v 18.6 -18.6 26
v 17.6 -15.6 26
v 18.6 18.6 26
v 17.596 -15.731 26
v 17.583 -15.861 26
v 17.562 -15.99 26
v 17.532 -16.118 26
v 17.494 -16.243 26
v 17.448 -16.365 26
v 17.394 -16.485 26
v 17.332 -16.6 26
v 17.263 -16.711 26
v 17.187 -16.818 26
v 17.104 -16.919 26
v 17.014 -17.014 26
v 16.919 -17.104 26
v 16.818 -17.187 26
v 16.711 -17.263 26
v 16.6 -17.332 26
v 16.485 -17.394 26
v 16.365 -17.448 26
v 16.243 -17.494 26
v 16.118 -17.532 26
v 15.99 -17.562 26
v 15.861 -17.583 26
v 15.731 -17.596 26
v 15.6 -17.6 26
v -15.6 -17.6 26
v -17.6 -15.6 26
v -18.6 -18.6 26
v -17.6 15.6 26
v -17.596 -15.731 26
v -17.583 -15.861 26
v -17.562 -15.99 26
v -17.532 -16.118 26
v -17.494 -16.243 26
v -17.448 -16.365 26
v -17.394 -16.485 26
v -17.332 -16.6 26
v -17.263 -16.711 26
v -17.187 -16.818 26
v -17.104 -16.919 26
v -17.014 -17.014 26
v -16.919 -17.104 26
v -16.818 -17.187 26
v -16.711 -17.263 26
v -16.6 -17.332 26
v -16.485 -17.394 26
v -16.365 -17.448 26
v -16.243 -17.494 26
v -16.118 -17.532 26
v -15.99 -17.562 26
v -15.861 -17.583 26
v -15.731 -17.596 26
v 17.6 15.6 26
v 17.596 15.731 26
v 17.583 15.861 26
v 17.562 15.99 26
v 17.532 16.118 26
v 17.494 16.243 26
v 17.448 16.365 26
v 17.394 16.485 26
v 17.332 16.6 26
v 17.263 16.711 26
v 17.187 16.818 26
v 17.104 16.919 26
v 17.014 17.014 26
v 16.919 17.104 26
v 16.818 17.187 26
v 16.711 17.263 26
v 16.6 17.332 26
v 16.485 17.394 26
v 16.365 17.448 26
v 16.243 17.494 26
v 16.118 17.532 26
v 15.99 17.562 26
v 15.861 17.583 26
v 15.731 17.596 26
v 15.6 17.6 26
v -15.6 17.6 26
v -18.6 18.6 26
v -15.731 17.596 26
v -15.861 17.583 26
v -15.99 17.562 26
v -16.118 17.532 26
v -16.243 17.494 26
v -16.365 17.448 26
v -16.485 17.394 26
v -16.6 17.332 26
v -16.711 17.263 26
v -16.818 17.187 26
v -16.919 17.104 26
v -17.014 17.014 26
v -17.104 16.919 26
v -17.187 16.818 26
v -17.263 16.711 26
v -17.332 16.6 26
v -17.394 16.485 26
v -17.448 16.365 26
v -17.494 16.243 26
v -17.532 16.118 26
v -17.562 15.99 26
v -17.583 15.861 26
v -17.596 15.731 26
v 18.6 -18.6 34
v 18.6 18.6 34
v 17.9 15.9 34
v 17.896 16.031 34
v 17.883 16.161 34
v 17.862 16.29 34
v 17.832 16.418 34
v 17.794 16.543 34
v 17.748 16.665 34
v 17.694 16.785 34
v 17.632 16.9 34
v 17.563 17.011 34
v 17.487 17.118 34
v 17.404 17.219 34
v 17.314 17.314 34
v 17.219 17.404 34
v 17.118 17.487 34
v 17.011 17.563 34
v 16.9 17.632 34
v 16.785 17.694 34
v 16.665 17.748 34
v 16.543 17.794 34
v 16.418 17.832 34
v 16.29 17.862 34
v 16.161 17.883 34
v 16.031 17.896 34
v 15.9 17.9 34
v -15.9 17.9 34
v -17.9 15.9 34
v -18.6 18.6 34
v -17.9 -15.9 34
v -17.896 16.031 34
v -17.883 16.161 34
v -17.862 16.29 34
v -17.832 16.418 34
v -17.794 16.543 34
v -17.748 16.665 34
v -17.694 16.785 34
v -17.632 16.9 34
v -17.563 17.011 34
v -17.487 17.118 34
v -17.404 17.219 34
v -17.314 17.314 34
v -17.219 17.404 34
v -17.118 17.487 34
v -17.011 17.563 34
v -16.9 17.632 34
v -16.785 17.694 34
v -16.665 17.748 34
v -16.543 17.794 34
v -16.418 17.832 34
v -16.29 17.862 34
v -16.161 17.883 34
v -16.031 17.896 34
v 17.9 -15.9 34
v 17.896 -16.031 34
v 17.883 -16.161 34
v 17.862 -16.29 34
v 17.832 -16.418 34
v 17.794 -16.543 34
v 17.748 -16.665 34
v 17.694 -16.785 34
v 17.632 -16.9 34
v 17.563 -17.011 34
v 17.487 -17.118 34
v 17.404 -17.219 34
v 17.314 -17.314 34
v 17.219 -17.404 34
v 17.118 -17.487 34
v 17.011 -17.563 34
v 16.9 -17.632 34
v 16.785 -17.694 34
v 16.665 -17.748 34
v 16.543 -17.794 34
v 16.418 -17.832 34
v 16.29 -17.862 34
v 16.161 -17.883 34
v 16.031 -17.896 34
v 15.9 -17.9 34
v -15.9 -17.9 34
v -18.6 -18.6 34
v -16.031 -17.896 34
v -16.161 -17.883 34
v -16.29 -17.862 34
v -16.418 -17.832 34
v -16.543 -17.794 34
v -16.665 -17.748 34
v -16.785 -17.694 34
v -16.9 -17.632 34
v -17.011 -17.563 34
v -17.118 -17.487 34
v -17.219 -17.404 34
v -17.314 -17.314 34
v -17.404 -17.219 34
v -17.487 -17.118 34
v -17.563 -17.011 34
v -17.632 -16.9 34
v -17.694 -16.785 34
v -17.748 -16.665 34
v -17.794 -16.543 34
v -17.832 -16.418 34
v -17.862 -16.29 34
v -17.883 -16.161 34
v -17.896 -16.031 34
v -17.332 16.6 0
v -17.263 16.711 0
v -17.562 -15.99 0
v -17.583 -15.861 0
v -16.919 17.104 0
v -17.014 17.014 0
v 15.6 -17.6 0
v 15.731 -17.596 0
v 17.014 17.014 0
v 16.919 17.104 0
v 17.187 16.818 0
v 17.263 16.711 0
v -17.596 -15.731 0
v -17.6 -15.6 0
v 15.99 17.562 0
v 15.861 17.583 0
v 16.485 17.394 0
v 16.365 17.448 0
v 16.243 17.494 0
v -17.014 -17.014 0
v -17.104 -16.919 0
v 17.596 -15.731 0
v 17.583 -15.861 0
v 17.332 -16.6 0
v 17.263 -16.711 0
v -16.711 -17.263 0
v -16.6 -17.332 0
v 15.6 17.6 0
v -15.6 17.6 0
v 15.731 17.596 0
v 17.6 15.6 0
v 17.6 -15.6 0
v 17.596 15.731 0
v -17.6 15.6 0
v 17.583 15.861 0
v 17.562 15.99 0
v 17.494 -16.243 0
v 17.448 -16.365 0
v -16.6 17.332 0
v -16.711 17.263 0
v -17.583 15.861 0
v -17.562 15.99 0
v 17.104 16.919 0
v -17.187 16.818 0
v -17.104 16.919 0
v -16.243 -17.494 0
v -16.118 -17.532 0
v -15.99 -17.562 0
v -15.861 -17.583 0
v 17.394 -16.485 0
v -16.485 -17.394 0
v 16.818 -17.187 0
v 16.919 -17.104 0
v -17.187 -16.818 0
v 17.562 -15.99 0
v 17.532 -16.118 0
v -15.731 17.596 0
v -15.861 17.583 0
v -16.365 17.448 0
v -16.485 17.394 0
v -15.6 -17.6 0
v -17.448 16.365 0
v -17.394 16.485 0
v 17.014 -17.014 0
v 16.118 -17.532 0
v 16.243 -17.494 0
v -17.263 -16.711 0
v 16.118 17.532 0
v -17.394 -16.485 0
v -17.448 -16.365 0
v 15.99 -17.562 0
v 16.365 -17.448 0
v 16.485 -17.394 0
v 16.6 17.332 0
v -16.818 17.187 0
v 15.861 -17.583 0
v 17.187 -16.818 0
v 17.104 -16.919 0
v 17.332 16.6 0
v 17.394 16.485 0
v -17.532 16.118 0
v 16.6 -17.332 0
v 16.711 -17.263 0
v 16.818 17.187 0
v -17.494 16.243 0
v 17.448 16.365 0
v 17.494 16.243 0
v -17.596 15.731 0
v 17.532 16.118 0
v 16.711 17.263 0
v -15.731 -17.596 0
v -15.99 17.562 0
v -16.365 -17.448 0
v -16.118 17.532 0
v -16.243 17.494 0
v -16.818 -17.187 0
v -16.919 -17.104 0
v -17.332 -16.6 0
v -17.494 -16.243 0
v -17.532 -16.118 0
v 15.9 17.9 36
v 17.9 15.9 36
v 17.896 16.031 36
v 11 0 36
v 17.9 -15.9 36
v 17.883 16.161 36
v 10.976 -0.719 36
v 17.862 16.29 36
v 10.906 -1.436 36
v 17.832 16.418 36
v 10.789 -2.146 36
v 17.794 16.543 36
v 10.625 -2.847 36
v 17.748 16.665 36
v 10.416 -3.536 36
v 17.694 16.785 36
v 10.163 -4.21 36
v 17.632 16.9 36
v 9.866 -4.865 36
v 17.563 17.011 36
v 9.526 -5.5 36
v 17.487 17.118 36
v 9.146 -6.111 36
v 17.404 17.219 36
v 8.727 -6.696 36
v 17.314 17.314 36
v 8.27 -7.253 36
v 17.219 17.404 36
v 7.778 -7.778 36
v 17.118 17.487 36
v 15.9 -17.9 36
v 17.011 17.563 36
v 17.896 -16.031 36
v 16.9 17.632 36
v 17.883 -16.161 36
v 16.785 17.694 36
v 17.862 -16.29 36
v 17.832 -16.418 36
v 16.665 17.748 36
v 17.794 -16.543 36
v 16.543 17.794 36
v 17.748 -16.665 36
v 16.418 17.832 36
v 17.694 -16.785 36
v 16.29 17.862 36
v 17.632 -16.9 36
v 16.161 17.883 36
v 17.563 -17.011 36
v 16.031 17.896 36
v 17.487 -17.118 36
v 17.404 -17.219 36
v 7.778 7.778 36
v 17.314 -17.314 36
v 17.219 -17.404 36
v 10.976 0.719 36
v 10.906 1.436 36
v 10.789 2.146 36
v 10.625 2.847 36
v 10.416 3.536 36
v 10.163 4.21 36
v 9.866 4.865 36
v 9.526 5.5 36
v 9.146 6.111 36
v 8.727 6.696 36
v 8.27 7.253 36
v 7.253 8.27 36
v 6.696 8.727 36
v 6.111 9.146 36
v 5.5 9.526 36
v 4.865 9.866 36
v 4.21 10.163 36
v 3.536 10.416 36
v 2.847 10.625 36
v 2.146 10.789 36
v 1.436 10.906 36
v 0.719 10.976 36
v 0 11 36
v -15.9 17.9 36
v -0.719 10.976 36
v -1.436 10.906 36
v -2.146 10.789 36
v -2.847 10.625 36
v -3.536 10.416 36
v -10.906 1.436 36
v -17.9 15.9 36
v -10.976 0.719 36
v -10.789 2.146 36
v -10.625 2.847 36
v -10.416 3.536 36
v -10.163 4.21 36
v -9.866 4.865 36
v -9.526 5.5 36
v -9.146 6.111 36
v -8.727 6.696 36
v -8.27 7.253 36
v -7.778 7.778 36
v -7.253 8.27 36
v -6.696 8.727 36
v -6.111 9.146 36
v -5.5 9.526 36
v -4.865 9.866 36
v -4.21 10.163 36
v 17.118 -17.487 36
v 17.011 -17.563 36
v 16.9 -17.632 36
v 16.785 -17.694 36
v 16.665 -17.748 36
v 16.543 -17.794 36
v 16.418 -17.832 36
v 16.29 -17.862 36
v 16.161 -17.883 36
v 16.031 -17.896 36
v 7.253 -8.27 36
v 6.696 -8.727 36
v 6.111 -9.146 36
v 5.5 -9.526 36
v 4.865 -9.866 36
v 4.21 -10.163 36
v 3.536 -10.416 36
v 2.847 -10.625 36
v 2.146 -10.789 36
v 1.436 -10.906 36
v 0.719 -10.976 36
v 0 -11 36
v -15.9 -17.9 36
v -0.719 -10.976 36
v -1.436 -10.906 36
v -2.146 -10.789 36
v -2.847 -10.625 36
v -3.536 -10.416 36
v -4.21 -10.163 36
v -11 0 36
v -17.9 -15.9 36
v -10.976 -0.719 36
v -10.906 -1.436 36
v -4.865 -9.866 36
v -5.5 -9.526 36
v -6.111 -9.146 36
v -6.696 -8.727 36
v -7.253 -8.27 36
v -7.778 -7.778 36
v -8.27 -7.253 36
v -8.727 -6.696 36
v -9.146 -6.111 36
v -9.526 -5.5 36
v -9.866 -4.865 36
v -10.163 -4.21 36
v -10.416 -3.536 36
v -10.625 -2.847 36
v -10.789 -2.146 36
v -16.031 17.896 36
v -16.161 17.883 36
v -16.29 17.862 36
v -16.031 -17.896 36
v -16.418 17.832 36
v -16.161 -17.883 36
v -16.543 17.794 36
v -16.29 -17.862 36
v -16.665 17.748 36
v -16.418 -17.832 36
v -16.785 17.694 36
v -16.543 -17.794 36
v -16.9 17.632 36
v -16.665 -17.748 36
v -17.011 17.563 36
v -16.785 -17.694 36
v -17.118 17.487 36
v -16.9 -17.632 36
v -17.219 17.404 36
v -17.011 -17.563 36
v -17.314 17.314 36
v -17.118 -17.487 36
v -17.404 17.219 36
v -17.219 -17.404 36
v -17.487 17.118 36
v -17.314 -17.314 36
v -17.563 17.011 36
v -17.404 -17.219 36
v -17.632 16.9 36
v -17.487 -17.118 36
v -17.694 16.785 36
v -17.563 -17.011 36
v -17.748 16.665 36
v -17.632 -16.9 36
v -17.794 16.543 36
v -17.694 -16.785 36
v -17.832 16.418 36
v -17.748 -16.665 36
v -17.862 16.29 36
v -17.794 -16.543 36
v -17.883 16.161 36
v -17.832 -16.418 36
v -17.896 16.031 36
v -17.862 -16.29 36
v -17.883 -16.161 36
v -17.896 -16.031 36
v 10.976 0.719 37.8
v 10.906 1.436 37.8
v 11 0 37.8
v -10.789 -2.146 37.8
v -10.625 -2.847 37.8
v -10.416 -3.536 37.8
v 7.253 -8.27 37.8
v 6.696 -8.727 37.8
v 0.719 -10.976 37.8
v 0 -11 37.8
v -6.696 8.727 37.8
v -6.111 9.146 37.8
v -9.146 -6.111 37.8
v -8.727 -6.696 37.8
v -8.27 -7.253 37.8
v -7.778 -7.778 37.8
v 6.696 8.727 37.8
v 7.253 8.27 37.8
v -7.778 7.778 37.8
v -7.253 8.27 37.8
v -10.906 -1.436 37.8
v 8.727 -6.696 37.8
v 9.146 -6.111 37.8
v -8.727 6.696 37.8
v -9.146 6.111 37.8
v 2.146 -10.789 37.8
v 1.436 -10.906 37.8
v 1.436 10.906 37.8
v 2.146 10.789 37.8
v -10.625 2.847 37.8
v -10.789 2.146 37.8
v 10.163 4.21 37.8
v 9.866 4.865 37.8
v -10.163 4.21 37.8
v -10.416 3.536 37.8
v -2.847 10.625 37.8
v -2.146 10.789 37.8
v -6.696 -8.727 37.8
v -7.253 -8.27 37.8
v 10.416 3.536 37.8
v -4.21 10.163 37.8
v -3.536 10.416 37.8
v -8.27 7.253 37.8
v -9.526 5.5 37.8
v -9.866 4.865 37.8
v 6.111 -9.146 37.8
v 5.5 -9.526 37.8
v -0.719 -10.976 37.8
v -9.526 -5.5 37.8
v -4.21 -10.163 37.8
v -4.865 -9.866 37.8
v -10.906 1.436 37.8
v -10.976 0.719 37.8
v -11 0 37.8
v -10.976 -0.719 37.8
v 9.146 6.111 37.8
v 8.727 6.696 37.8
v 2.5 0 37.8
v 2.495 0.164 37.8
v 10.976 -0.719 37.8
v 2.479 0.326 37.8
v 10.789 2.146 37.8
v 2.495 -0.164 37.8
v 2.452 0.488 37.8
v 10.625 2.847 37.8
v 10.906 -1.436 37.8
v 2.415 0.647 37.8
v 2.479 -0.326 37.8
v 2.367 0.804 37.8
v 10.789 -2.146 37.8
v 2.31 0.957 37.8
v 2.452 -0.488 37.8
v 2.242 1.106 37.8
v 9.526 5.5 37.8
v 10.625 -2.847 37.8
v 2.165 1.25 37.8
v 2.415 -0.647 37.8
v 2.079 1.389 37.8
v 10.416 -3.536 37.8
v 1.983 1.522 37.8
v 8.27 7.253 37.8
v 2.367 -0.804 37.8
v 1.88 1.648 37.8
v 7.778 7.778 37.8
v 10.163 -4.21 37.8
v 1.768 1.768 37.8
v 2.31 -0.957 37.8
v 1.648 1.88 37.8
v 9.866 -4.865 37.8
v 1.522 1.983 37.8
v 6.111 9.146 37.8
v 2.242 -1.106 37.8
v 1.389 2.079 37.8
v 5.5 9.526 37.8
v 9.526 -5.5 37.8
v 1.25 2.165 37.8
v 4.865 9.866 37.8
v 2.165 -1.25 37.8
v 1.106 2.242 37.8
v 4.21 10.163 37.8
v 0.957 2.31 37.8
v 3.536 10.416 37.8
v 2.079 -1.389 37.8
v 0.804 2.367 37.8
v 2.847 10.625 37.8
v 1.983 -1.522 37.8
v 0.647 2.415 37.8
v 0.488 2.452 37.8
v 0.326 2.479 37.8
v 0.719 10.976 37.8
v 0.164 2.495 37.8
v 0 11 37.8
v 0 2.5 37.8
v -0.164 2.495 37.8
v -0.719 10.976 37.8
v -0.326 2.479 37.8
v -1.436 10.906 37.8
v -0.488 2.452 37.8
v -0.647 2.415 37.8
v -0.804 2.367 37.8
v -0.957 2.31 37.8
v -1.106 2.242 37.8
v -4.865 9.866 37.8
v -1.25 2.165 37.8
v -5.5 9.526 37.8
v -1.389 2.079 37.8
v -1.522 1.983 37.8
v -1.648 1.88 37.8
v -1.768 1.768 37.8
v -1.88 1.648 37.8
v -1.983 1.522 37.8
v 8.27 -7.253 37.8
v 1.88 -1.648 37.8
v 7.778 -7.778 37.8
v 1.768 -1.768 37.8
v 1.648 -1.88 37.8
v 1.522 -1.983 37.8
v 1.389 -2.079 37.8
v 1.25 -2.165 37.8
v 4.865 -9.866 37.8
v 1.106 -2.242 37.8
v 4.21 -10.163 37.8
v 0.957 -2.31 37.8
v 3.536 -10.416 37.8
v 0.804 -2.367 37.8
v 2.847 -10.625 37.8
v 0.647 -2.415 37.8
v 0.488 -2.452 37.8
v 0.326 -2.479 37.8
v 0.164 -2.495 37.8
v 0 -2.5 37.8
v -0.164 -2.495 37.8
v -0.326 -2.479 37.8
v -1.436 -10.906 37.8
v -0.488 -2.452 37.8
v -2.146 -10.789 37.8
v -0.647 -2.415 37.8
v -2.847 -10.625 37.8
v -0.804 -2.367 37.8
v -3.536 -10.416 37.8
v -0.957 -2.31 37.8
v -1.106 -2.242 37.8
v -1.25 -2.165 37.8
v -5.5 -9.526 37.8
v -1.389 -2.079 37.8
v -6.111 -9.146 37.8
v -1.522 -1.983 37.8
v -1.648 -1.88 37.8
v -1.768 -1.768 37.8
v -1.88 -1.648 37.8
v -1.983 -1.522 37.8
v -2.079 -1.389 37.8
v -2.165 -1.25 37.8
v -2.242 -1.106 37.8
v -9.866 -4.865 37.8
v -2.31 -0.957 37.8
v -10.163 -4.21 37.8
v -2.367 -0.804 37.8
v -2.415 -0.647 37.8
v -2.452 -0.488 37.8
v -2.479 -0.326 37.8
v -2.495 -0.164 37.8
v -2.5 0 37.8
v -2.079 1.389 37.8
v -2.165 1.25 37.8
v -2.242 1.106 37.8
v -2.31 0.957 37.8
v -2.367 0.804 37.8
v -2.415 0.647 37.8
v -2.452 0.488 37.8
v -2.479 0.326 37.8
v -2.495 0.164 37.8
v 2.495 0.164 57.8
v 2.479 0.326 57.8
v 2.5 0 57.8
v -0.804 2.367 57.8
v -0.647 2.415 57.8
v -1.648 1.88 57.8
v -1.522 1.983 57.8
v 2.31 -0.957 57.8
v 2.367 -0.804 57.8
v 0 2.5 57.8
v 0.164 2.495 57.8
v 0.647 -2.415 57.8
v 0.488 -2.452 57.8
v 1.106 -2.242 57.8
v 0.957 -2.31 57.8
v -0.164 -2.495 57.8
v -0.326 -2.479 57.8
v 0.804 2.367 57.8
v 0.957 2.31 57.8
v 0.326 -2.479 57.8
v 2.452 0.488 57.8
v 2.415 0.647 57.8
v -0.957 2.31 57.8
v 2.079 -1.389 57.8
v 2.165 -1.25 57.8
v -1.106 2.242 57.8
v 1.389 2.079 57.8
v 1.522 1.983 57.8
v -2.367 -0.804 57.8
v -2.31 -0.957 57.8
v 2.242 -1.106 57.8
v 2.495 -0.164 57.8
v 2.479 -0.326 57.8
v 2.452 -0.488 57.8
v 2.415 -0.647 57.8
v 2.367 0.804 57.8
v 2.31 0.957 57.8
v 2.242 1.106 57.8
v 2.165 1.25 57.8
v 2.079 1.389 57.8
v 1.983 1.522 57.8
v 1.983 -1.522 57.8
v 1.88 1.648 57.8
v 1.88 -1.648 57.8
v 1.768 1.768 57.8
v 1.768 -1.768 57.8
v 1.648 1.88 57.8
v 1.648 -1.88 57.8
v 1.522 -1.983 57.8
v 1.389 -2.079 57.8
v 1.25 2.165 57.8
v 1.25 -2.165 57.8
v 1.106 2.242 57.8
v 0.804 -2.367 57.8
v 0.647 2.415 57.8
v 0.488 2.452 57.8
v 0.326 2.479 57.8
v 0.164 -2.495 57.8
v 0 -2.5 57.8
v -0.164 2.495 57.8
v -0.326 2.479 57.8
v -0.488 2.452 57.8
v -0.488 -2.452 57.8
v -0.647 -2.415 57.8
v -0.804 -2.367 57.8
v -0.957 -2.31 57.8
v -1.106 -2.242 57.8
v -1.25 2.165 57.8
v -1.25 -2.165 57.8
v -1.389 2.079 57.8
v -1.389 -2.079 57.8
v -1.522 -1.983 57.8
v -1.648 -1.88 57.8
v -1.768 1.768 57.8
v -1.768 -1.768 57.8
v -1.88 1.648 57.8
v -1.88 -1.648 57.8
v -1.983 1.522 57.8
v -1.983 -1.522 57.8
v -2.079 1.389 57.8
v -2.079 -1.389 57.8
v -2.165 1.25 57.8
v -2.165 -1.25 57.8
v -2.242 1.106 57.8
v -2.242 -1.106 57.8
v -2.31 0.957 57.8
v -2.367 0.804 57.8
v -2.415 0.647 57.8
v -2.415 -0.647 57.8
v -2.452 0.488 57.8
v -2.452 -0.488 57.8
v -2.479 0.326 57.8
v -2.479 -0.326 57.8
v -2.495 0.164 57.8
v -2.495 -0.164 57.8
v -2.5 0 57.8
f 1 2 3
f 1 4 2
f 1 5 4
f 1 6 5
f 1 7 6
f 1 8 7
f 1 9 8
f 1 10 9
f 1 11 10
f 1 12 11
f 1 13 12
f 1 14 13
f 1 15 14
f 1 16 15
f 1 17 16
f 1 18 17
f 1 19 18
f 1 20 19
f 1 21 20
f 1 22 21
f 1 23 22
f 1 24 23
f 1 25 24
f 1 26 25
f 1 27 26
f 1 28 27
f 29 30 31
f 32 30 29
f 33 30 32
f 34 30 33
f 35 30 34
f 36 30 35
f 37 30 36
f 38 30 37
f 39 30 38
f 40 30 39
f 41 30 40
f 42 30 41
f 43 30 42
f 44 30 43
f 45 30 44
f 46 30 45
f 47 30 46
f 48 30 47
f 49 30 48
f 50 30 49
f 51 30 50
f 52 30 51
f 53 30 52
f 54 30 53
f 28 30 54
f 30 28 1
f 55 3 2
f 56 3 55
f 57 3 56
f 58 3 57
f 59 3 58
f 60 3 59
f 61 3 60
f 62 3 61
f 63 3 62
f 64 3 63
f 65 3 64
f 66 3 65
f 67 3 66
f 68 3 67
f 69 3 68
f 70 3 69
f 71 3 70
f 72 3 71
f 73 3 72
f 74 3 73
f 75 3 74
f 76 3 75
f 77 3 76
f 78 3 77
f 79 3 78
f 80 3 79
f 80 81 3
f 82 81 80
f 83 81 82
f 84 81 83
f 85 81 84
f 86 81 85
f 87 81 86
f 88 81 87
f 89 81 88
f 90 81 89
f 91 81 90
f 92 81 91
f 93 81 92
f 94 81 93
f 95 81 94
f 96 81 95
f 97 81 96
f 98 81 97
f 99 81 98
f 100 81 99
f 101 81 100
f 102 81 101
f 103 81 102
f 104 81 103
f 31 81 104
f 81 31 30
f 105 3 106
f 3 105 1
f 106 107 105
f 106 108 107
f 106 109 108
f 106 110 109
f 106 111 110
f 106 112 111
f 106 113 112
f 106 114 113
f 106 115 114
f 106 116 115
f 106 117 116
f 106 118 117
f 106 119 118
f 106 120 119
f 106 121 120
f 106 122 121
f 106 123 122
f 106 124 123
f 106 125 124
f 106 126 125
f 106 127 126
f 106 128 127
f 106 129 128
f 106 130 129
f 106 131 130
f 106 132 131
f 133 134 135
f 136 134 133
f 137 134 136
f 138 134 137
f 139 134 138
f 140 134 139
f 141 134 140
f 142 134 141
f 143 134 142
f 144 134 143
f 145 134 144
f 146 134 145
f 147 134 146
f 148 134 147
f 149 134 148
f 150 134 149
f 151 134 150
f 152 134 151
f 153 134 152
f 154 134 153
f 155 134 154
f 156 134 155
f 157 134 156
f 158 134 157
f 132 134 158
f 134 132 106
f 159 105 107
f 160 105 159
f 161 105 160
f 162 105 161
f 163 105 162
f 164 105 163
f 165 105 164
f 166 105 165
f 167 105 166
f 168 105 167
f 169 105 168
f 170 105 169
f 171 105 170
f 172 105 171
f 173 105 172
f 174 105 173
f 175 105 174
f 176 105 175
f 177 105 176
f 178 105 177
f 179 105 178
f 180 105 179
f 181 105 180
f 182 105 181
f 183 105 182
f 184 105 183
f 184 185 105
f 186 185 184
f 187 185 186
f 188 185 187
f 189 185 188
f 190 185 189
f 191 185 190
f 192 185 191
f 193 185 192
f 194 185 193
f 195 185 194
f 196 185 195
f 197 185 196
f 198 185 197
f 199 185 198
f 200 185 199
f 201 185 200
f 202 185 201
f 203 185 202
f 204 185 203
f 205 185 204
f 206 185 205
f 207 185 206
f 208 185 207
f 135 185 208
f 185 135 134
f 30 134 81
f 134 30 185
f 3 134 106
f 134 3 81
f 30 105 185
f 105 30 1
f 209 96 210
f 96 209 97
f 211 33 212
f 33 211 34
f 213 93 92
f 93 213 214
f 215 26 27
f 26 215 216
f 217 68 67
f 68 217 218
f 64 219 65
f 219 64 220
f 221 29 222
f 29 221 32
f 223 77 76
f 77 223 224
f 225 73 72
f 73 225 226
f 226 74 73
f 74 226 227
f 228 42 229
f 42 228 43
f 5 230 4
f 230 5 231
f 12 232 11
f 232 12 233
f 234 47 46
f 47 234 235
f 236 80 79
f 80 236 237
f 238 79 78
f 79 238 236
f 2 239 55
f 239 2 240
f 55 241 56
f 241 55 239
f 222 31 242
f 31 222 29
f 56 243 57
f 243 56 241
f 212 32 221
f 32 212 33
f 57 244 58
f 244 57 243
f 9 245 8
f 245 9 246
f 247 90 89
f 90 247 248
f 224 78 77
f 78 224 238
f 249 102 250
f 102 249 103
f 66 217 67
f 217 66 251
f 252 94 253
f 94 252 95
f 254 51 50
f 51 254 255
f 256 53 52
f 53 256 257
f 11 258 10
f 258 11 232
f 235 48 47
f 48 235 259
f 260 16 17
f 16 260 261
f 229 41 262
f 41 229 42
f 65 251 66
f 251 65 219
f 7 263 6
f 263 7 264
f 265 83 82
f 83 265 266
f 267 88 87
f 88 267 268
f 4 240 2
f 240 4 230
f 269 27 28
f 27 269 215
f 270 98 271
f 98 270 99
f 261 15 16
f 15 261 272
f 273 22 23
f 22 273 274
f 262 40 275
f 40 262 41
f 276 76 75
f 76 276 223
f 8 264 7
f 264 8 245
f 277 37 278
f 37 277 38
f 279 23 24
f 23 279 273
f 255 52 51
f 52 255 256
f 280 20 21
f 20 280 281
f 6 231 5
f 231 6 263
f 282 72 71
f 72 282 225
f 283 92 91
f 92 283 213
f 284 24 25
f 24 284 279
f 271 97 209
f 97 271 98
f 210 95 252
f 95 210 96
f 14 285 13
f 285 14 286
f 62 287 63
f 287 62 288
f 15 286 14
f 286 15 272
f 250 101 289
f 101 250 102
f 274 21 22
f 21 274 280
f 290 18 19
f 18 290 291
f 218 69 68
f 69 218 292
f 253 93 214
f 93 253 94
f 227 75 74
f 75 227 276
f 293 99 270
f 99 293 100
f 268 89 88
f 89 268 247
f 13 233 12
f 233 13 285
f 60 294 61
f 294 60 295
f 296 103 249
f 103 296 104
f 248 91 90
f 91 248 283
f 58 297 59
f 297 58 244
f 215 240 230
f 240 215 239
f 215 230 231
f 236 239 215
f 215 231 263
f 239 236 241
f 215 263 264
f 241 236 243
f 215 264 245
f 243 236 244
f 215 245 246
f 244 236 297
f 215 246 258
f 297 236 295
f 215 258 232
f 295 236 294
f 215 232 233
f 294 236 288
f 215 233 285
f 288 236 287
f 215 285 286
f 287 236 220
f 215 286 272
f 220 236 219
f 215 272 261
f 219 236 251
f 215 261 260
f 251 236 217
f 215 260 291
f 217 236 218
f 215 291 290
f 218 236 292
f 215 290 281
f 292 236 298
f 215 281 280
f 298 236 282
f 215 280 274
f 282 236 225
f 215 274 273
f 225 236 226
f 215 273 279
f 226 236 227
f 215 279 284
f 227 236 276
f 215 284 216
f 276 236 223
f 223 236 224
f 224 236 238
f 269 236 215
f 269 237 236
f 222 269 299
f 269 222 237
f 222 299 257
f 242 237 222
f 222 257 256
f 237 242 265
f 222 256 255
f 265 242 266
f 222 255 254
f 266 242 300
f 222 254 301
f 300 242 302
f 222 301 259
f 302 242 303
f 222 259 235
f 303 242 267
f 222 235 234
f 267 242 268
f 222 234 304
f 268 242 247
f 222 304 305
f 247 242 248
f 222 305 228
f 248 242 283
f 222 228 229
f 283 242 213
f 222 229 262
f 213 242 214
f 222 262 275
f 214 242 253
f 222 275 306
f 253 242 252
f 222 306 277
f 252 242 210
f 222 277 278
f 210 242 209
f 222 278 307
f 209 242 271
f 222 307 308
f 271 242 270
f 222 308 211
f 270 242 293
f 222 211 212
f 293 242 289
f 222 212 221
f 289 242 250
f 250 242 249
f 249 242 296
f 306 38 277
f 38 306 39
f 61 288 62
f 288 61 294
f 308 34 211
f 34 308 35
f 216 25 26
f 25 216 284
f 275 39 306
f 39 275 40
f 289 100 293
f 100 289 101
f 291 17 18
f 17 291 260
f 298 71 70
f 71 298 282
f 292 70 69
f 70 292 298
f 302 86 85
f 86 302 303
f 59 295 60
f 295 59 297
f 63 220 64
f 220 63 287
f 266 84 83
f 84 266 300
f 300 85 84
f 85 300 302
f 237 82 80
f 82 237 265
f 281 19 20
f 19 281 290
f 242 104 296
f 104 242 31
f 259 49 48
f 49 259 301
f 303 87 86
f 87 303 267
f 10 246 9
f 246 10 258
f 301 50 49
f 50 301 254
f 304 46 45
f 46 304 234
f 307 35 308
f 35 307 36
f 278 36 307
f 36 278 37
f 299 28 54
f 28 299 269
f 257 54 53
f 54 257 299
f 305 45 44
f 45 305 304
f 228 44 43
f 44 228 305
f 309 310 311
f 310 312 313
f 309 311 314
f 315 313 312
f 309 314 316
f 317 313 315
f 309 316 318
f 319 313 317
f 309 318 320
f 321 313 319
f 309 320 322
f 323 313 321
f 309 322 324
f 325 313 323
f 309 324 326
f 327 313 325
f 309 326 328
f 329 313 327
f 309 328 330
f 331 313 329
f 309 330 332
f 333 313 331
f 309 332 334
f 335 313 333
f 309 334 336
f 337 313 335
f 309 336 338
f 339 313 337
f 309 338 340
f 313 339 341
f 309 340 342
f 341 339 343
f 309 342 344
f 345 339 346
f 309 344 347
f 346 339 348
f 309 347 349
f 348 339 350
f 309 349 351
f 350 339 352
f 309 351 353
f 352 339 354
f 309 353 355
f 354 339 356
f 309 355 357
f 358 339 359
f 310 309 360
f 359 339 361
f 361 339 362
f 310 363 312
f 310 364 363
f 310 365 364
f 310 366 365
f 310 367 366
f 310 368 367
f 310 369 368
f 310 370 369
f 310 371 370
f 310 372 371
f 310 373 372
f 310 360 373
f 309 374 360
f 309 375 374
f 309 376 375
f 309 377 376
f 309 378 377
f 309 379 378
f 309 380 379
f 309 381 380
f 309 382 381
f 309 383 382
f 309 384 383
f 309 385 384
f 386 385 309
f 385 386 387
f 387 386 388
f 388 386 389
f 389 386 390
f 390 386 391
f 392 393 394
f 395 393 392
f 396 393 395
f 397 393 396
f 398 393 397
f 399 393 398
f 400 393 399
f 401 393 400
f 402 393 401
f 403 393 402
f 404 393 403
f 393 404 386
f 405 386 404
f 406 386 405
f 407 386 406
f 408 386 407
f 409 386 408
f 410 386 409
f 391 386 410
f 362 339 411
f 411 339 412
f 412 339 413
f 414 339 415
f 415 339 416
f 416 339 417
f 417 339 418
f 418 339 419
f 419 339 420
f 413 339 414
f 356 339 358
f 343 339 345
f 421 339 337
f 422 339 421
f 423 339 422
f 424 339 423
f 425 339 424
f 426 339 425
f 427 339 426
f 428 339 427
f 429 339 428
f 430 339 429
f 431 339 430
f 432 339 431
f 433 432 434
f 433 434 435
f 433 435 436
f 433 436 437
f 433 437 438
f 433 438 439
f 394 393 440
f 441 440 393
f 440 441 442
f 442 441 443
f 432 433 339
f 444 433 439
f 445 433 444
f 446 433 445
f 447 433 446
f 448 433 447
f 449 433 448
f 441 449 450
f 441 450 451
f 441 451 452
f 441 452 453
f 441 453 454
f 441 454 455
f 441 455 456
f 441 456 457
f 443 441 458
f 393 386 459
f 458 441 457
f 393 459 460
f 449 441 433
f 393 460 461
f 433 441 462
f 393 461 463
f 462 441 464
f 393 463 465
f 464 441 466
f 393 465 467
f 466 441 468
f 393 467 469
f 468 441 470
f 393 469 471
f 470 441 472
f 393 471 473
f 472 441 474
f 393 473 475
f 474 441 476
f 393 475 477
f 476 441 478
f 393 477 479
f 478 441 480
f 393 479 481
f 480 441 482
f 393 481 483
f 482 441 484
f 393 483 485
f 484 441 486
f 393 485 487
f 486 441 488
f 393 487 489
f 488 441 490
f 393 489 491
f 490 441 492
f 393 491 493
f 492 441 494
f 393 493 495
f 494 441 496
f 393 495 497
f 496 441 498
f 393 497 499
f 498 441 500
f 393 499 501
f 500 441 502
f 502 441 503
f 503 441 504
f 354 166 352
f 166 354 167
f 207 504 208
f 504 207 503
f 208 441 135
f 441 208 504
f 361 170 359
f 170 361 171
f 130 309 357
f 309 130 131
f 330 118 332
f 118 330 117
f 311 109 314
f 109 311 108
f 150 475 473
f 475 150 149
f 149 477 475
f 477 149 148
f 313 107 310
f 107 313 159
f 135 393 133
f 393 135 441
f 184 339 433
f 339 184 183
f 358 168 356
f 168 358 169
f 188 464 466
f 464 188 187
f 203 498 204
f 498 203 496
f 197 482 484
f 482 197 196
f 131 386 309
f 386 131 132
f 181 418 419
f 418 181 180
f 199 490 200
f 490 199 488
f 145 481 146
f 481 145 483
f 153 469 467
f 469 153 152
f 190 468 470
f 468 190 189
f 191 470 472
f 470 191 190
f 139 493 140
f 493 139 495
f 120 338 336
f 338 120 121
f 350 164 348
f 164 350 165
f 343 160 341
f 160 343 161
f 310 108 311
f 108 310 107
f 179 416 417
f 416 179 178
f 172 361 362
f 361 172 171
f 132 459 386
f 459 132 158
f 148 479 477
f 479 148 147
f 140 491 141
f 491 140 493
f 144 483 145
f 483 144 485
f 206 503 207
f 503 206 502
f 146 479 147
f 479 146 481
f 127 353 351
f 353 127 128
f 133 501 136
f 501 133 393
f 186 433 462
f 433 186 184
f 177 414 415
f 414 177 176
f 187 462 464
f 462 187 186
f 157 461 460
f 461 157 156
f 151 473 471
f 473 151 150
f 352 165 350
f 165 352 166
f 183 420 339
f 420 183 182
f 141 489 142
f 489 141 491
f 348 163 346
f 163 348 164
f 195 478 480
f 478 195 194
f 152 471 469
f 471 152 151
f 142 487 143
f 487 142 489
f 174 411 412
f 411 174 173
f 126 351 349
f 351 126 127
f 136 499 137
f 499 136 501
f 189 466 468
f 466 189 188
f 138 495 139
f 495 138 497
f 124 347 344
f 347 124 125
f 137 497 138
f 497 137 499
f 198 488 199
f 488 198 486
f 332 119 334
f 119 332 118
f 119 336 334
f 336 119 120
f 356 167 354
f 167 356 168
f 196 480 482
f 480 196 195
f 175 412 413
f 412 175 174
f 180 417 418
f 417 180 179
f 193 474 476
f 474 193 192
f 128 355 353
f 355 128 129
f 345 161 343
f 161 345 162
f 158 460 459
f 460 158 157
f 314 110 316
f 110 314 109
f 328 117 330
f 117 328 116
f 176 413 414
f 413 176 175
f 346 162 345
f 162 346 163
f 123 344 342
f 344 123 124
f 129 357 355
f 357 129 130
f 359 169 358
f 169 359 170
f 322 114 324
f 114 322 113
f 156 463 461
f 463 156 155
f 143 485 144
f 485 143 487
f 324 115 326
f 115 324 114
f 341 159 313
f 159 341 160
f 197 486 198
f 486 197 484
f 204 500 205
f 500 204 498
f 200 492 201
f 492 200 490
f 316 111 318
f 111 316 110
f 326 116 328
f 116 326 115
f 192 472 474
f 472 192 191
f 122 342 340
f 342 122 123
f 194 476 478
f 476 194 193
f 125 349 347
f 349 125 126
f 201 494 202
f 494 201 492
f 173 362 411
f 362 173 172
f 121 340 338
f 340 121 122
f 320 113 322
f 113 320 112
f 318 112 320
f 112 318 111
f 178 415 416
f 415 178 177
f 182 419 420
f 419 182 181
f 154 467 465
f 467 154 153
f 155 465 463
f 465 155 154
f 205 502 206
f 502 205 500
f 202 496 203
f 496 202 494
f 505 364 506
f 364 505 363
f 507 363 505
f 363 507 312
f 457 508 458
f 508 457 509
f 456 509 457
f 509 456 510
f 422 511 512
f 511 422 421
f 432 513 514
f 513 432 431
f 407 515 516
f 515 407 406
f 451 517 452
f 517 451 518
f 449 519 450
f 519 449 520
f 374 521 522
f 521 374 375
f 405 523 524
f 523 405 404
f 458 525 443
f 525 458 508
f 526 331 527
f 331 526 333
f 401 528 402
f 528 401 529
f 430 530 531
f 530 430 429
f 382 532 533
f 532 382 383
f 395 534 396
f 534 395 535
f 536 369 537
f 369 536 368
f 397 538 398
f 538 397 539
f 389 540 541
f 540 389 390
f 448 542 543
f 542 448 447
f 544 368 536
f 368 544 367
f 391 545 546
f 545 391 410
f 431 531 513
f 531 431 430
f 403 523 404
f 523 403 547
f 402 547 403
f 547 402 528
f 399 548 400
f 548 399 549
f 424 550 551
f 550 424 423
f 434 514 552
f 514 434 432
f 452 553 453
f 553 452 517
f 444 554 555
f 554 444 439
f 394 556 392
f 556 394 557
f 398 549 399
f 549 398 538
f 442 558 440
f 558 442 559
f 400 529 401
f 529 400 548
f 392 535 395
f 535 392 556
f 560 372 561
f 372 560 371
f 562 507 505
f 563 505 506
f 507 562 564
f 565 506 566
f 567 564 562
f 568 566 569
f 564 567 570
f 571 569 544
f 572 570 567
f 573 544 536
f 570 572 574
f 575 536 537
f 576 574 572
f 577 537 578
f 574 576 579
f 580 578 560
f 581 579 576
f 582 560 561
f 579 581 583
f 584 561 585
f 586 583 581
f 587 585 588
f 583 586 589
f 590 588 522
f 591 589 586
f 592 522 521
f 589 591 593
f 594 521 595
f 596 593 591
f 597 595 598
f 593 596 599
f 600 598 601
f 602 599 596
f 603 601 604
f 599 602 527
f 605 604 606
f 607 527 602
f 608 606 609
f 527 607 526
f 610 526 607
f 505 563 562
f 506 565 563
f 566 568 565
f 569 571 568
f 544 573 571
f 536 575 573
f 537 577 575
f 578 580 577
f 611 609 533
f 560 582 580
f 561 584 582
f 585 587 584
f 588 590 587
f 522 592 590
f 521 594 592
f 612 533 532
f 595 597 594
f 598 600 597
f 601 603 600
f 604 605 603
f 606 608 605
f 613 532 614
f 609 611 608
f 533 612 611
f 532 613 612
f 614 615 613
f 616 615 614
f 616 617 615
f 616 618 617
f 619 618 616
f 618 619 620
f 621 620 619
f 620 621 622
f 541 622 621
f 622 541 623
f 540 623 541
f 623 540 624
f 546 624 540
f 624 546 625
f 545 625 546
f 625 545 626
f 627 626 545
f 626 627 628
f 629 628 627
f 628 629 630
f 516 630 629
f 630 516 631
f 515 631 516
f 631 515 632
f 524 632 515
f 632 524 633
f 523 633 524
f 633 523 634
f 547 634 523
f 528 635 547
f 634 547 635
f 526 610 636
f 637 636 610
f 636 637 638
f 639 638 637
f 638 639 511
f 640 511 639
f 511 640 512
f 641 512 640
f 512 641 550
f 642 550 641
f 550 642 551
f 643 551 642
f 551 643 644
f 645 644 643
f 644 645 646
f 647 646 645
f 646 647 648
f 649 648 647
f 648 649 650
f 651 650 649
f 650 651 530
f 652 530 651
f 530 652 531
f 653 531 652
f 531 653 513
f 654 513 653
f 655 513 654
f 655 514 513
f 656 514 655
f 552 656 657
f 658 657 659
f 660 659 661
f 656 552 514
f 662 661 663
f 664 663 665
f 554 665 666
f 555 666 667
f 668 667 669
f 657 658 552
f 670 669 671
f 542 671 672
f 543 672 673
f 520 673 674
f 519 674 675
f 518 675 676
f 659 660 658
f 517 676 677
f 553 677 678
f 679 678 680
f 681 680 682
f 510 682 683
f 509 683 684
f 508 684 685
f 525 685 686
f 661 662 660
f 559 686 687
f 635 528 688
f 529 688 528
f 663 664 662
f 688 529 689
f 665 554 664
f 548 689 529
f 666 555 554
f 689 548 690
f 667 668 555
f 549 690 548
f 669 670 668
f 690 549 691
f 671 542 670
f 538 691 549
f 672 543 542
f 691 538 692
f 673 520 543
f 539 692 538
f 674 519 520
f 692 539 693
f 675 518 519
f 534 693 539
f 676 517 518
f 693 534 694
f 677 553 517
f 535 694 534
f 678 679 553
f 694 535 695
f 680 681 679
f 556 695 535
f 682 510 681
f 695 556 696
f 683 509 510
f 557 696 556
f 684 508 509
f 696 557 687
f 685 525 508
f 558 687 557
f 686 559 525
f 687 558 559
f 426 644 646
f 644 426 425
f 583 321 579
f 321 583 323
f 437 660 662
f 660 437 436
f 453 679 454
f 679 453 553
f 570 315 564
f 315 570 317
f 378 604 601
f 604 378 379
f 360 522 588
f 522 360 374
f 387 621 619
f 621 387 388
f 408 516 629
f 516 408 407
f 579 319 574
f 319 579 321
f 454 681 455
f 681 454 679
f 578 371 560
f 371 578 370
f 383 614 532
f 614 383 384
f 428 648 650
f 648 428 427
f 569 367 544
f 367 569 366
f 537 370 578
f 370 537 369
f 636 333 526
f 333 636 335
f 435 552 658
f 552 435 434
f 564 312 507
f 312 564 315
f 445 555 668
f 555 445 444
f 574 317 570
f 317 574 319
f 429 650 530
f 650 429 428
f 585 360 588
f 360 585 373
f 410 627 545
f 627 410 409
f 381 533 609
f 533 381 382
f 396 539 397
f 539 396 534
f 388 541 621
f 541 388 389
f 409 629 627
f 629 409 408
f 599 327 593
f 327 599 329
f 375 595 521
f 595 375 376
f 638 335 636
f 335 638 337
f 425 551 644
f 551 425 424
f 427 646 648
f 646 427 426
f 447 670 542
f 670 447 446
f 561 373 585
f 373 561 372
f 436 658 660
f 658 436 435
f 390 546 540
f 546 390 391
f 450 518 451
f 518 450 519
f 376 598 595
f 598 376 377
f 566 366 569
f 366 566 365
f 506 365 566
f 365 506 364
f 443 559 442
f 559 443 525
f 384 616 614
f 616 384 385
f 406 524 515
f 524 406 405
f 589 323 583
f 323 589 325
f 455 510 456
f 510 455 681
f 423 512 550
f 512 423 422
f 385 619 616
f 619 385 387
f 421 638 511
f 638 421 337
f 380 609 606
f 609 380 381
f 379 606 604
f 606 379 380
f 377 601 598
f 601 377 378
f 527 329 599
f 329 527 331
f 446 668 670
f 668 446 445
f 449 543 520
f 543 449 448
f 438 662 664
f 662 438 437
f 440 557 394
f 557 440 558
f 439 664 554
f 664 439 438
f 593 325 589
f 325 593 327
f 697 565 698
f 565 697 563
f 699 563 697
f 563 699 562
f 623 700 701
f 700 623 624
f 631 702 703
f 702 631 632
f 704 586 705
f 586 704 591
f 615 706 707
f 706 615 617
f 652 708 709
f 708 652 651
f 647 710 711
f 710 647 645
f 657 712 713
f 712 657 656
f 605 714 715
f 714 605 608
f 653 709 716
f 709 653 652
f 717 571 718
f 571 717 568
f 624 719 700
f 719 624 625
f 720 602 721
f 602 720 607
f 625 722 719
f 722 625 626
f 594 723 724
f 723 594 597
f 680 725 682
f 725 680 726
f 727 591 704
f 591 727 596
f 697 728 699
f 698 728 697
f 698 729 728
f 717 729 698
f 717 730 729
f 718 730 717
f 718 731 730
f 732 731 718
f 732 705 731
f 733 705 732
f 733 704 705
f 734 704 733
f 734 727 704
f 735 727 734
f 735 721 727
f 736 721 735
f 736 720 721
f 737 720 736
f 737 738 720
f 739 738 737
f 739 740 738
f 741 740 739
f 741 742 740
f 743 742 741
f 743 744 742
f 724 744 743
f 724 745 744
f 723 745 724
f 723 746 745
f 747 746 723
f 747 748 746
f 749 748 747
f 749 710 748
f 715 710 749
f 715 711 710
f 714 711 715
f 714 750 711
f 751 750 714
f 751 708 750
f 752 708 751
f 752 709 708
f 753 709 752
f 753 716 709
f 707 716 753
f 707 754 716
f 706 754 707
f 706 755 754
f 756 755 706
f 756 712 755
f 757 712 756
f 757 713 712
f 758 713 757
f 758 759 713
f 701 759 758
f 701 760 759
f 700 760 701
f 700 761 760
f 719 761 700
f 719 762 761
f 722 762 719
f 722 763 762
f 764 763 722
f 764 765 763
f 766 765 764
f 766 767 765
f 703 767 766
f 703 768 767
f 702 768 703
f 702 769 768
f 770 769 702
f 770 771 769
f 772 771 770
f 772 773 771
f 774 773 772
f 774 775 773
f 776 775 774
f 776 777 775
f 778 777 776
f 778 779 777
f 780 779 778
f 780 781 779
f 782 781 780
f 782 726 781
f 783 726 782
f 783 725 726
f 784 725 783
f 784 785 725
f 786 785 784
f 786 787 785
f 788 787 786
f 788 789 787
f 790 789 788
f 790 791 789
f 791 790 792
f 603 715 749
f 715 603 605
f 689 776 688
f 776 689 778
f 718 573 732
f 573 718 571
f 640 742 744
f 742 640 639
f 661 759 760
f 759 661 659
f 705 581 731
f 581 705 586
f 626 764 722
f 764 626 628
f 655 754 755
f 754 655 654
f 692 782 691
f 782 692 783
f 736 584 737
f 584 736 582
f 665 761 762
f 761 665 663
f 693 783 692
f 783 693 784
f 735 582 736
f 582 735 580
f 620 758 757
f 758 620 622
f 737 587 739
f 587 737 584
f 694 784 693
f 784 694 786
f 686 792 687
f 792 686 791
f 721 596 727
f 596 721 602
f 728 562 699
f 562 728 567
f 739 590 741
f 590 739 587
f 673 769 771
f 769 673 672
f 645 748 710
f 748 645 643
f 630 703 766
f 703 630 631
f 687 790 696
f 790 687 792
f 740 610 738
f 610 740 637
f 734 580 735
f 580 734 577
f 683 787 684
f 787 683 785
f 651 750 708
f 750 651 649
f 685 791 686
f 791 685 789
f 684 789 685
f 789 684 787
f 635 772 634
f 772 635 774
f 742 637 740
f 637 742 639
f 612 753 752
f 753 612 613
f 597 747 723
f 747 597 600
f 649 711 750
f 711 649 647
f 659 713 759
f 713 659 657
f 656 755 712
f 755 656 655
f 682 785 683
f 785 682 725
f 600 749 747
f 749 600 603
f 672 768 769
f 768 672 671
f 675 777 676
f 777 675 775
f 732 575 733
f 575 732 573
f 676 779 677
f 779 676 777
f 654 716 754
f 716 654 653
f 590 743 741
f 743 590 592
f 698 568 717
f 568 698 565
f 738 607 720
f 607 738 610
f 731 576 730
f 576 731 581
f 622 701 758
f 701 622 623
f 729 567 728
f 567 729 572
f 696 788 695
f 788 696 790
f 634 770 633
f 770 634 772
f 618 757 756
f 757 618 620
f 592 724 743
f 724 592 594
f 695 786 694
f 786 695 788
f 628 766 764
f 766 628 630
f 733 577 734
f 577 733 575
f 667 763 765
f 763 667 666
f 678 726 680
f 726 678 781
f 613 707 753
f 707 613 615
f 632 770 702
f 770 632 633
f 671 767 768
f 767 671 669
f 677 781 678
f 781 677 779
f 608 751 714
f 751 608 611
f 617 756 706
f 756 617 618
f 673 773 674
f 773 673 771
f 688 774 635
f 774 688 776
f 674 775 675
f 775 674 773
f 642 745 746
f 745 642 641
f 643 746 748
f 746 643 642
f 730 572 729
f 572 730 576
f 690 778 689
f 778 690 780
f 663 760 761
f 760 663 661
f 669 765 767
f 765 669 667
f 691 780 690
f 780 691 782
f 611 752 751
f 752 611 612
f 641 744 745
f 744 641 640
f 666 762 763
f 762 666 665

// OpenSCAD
$fn = 96;

// Parameters (mm)
face_w = 35.2;          // motor face width (square)
body_len = 36.0;        // motor body length (excluding shaft)
shaft_d = 5.0;          // shaft diameter
shaft_len = 20.0;       // assumed shaft protrusion length
mount_spacing = 26.0;   // mounting hole center-to-center spacing
mount_hole_d = 3.2;     // typical M3 clearance
face_plate_th = 2.0;    // front face plate thickness (visual)
pilot_d = 22.0;         // typical NEMA pilot diameter (visual)
pilot_h = 1.8;          // pilot height (visual)
corner_r = 2.0;         // body corner radius (visual)

// Helpers
module rounded_square_prism(w, h, r, center=false) {
    // 2D rounded square via hull of circles, then linear_extrude
    linear_extrude(height=h, center=center)
        hull() {
            for (sx = [-1, 1], sy = [-1, 1])
                translate([sx*(w/2 - r), sy*(w/2 - r)]) circle(r=r);
        }
}

module stepper_motor() {
    // Body
    color([0.25,0.25,0.25])
    translate([0,0,0])
    rounded_square_prism(face_w, body_len, corner_r, center=false);

    // Front face plate (slightly larger, thin)
    color([0.35,0.35,0.35])
    translate([0,0,body_len - face_plate_th])
    rounded_square_prism(face_w + 0.6, face_plate_th, corner_r, center=false);

    // Pilot boss
    color([0.55,0.55,0.55])
    translate([0,0,body_len])
    cylinder(d=pilot_d, h=pilot_h, center=false);

    // Shaft
    color([0.75,0.75,0.75])
    translate([0,0,body_len + pilot_h])
    cylinder(d=shaft_d, h=shaft_len, center=false);

    // Mounting holes (through front plate + a bit into body for visibility)
    // Represented as cutouts in a thin "front region" for render clarity
    difference() {
        // front region to subtract from (invisible)
        translate([0,0,body_len - 6])
            cube([face_w + 2, face_w + 2, 8], center=true);
        for (x = [-mount_spacing/2, mount_spacing/2])
            for (y = [-mount_spacing/2, mount_spacing/2])
                translate([x,y,body_len - 10])
                    cylinder(d=mount_hole_d, h=20, center=false);
    }
}

stepper_motor();
